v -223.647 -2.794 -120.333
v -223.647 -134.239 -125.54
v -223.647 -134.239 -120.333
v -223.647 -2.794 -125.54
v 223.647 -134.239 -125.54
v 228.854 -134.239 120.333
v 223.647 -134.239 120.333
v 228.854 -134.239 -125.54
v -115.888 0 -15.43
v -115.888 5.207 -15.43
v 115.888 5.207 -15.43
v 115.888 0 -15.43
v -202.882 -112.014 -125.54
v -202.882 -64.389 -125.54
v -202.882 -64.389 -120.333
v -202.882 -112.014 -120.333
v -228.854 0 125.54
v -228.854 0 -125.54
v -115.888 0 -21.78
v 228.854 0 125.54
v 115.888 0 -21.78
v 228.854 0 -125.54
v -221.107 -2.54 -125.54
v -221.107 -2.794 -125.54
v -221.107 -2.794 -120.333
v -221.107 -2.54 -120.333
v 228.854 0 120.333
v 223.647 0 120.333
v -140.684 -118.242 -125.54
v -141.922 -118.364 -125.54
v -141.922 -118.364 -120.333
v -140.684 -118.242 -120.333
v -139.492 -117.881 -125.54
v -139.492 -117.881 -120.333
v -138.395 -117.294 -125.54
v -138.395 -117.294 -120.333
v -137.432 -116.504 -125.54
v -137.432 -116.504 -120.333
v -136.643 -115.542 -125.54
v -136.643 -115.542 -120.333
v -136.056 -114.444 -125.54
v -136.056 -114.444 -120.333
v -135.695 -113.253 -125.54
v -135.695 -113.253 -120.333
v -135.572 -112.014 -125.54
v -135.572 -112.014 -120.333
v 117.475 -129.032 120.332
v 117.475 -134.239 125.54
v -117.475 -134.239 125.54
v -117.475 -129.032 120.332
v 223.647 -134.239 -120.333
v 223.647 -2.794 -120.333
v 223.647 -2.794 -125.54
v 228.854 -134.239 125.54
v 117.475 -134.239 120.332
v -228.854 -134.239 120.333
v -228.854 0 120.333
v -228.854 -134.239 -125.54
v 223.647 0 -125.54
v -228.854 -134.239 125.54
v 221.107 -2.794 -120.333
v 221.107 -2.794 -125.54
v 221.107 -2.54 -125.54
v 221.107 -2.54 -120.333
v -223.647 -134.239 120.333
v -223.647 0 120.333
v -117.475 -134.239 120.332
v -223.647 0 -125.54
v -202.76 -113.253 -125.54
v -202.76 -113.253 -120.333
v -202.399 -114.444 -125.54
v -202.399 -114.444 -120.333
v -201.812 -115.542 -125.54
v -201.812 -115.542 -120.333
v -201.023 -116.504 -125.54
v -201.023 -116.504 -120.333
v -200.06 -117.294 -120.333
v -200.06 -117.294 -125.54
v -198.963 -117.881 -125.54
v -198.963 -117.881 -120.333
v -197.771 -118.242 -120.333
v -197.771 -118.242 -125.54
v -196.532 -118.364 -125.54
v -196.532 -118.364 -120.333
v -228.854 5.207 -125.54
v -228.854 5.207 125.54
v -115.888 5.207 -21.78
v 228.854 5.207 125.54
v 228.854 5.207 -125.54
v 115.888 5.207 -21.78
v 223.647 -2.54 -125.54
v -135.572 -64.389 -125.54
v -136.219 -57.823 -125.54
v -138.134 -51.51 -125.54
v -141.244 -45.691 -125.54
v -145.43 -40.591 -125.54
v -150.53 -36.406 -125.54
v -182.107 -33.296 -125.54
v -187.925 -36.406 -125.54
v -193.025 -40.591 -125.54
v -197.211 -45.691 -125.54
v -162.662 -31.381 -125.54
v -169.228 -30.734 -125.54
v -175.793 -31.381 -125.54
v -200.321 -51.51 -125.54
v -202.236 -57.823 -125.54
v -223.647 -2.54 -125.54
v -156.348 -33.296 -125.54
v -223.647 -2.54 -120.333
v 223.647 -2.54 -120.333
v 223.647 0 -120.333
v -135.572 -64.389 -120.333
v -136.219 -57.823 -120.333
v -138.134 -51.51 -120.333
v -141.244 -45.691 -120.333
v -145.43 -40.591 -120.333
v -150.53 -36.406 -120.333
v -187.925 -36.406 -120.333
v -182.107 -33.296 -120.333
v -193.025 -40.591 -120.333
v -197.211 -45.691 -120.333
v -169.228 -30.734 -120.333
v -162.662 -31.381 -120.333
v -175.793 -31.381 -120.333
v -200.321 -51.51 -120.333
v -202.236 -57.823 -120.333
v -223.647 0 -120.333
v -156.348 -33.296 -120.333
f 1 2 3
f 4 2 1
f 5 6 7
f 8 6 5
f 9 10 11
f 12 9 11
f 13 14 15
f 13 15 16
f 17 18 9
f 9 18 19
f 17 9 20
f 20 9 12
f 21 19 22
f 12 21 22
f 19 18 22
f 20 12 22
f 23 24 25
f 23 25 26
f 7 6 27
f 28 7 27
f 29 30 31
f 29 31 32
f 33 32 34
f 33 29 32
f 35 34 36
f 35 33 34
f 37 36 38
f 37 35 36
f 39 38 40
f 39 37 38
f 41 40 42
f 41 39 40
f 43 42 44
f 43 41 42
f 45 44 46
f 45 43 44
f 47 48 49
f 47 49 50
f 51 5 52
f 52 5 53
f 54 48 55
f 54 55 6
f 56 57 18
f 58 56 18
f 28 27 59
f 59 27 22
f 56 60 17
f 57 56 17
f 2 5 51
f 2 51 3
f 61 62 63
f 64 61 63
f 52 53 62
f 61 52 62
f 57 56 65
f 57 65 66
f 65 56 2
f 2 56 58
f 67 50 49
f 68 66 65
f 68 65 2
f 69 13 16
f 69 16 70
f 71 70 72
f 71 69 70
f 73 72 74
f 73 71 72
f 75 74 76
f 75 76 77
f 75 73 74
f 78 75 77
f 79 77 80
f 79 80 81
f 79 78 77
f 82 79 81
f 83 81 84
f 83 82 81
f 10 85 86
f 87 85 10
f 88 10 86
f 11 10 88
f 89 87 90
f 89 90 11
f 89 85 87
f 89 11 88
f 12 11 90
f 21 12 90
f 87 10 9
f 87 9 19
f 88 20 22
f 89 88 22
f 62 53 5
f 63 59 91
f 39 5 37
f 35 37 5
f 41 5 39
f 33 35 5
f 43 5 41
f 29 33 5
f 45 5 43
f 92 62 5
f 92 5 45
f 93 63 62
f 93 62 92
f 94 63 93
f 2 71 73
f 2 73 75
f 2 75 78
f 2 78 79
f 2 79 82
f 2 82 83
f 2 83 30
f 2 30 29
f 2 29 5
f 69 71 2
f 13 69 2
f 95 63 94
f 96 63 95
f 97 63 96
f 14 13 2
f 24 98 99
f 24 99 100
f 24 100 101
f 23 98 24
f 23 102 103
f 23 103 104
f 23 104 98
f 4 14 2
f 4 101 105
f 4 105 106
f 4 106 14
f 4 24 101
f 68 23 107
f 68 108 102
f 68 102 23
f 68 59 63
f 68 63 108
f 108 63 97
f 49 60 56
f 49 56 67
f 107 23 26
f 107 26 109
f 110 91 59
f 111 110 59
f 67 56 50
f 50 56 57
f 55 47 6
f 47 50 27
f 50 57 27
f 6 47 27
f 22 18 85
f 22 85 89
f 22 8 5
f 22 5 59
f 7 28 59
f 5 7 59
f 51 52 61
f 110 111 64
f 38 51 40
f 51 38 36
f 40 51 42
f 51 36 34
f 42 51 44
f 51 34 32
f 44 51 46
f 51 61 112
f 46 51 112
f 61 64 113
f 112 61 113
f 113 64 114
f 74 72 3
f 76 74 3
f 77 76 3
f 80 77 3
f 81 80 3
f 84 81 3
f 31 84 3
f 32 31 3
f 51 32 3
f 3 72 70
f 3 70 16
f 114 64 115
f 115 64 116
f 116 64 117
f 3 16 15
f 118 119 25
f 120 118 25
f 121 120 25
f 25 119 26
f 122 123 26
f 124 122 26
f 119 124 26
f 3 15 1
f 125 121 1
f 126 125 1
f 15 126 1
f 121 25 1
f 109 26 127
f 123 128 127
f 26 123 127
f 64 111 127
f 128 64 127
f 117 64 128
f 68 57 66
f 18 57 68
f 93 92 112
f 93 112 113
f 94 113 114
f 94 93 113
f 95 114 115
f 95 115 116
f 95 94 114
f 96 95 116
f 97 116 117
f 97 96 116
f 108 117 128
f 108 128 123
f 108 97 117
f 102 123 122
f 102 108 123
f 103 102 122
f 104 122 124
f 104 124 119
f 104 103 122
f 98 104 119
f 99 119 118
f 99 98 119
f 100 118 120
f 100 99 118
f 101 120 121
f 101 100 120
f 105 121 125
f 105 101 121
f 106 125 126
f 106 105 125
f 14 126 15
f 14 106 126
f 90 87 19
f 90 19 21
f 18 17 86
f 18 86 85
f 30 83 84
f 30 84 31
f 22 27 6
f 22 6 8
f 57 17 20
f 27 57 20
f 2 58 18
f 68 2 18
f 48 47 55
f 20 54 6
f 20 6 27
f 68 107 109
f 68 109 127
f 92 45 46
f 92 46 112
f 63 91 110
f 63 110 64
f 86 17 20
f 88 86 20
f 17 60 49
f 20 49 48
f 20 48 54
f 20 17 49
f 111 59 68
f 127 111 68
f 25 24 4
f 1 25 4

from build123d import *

# Parameters (mm, degrees)
SKETCH1_W           = 457.708
SKETCH1_H           = 251.079
BOSS_EXTRUDE1_DEPTH = 5.207
SKETCH2_W           = 457.708
SKETCH2_H           = 134.239
BOSS_EXTRUDE2_DEPTH = 5.207
CUT_EXTRUDE1_DEPTH  = 117.475
SKETCH3_W           = 245.872
SKETCH3_H           = 134.239
BOSS_EXTRUDE5_DEPTH = 5.207
SKETCH5_W           = 231.775
SKETCH5_H           = 6.35
CUT_EXTRUDE2_DEPTH  = 140.446
SKETCH6_W           = 447.294
SKETCH6_H           = 134.239
BOSS_EXTRUDE6_DEPTH = 5.207
SKETCH7_W           = 2.54
SKETCH7_H           = 0.254
CUT_EXTRUDE3_DEPTH  = 5.207


with BuildPart() as part:
    # Sketch1 → Boss-Extrude1 (new body)
    with BuildSketch(Plane(origin=(0, 0, 0), x_dir=(1, 0, 0), z_dir=(0, 1, 0))):
        Rectangle(SKETCH1_W, SKETCH1_H)
    extrude(amount=BOSS_EXTRUDE1_DEPTH)

    # Sketch5 → Cut-Extrude2 (cut, through all)
    with BuildSketch(Plane(origin=(0, 5.207, 0), x_dir=(1, 0, 0), z_dir=(0, 1, 0))):
        with Locations((0, 18.6055)):
            Rectangle(SKETCH5_W, SKETCH5_H)
    extrude(amount=-CUT_EXTRUDE2_DEPTH, mode=Mode.SUBTRACT)


with BuildPart() as body_2:
    # Sketch2 → Boss-Extrude2 (new body)
    with BuildSketch(Plane.XY.offset(125.5395)):
        with Locations((0, -67.1195)):
            Rectangle(SKETCH2_W, SKETCH2_H)
    extrude(amount=-BOSS_EXTRUDE2_DEPTH)

    # Sketch4 → Cut-Extrude1 (cut, symmetric)
    with BuildSketch(Plane(origin=(0, 0, 0), x_dir=(0, 0, -1), z_dir=(1, 0, 0))):
        Polygon((-125.5395, -134.239), (-120.3325, -129.032), (-120.3325, -134.239), align=None)
    extrude(amount=CUT_EXTRUDE1_DEPTH, both=True, mode=Mode.SUBTRACT)


with BuildPart() as body_3:
    # Sketch3 → Boss-Extrude5 (new body)
    with BuildSketch(Plane(origin=(-228.854, 0, 0), x_dir=(0, 0, -1), z_dir=(1, 0, 0))):
        with Locations((2.6035, -67.1195)):
            Rectangle(SKETCH3_W, SKETCH3_H)
    extrude(amount=BOSS_EXTRUDE5_DEPTH)


with BuildPart() as body_4:
    # Mirror1: mirrored copy
    add(body_3.part.mirror(Plane(origin=(0, 0, 0), x_dir=(0, 0, 1), z_dir=(1, 0, 0))))


with BuildPart() as body_5:
    # Sketch6 → Boss-Extrude6 (new body)
    with BuildSketch(Plane(origin=(0, 0, -125.5395), x_dir=(-1, 0, 0), z_dir=(0, 0, -1))):
        with Locations((0, -67.1195)):
            Rectangle(SKETCH6_W, SKETCH6_H)
        with BuildLine():
            Line((202.8825, -64.389), (202.8825, -112.014))
            ThreePointArc((202.8825, -112.014), (201.022628061, -116.504128061), (196.5325, -118.364))
            Line((196.5325, -118.364), (141.9225, -118.364))
            ThreePointArc((141.9225, -118.364), (137.432371939, -116.504128061), (135.5725, -112.014))
            Line((135.5725, -112.014), (135.5725, -64.389))
            ThreePointArc((135.5725, -64.389), (169.2275, -30.734), (202.8825, -64.389))
        make_face(mode=Mode.SUBTRACT)
    extrude(amount=-BOSS_EXTRUDE6_DEPTH)

    # Sketch7 → Cut-Extrude3 (cut)
    with BuildSketch(Plane(origin=(0, 0, -125.5395), x_dir=(-1, 0, 0), z_dir=(0, 0, -1))):
        with Locations((222.377, -2.667)):
            Rectangle(SKETCH7_W, SKETCH7_H)
        with Locations((-222.377, -2.667)):
            Rectangle(SKETCH7_W, SKETCH7_H)
    extrude(amount=-CUT_EXTRUDE3_DEPTH, mode=Mode.SUBTRACT)


solid = Compound([part.part, body_2.part, body_3.part, body_4.part, body_5.part])
